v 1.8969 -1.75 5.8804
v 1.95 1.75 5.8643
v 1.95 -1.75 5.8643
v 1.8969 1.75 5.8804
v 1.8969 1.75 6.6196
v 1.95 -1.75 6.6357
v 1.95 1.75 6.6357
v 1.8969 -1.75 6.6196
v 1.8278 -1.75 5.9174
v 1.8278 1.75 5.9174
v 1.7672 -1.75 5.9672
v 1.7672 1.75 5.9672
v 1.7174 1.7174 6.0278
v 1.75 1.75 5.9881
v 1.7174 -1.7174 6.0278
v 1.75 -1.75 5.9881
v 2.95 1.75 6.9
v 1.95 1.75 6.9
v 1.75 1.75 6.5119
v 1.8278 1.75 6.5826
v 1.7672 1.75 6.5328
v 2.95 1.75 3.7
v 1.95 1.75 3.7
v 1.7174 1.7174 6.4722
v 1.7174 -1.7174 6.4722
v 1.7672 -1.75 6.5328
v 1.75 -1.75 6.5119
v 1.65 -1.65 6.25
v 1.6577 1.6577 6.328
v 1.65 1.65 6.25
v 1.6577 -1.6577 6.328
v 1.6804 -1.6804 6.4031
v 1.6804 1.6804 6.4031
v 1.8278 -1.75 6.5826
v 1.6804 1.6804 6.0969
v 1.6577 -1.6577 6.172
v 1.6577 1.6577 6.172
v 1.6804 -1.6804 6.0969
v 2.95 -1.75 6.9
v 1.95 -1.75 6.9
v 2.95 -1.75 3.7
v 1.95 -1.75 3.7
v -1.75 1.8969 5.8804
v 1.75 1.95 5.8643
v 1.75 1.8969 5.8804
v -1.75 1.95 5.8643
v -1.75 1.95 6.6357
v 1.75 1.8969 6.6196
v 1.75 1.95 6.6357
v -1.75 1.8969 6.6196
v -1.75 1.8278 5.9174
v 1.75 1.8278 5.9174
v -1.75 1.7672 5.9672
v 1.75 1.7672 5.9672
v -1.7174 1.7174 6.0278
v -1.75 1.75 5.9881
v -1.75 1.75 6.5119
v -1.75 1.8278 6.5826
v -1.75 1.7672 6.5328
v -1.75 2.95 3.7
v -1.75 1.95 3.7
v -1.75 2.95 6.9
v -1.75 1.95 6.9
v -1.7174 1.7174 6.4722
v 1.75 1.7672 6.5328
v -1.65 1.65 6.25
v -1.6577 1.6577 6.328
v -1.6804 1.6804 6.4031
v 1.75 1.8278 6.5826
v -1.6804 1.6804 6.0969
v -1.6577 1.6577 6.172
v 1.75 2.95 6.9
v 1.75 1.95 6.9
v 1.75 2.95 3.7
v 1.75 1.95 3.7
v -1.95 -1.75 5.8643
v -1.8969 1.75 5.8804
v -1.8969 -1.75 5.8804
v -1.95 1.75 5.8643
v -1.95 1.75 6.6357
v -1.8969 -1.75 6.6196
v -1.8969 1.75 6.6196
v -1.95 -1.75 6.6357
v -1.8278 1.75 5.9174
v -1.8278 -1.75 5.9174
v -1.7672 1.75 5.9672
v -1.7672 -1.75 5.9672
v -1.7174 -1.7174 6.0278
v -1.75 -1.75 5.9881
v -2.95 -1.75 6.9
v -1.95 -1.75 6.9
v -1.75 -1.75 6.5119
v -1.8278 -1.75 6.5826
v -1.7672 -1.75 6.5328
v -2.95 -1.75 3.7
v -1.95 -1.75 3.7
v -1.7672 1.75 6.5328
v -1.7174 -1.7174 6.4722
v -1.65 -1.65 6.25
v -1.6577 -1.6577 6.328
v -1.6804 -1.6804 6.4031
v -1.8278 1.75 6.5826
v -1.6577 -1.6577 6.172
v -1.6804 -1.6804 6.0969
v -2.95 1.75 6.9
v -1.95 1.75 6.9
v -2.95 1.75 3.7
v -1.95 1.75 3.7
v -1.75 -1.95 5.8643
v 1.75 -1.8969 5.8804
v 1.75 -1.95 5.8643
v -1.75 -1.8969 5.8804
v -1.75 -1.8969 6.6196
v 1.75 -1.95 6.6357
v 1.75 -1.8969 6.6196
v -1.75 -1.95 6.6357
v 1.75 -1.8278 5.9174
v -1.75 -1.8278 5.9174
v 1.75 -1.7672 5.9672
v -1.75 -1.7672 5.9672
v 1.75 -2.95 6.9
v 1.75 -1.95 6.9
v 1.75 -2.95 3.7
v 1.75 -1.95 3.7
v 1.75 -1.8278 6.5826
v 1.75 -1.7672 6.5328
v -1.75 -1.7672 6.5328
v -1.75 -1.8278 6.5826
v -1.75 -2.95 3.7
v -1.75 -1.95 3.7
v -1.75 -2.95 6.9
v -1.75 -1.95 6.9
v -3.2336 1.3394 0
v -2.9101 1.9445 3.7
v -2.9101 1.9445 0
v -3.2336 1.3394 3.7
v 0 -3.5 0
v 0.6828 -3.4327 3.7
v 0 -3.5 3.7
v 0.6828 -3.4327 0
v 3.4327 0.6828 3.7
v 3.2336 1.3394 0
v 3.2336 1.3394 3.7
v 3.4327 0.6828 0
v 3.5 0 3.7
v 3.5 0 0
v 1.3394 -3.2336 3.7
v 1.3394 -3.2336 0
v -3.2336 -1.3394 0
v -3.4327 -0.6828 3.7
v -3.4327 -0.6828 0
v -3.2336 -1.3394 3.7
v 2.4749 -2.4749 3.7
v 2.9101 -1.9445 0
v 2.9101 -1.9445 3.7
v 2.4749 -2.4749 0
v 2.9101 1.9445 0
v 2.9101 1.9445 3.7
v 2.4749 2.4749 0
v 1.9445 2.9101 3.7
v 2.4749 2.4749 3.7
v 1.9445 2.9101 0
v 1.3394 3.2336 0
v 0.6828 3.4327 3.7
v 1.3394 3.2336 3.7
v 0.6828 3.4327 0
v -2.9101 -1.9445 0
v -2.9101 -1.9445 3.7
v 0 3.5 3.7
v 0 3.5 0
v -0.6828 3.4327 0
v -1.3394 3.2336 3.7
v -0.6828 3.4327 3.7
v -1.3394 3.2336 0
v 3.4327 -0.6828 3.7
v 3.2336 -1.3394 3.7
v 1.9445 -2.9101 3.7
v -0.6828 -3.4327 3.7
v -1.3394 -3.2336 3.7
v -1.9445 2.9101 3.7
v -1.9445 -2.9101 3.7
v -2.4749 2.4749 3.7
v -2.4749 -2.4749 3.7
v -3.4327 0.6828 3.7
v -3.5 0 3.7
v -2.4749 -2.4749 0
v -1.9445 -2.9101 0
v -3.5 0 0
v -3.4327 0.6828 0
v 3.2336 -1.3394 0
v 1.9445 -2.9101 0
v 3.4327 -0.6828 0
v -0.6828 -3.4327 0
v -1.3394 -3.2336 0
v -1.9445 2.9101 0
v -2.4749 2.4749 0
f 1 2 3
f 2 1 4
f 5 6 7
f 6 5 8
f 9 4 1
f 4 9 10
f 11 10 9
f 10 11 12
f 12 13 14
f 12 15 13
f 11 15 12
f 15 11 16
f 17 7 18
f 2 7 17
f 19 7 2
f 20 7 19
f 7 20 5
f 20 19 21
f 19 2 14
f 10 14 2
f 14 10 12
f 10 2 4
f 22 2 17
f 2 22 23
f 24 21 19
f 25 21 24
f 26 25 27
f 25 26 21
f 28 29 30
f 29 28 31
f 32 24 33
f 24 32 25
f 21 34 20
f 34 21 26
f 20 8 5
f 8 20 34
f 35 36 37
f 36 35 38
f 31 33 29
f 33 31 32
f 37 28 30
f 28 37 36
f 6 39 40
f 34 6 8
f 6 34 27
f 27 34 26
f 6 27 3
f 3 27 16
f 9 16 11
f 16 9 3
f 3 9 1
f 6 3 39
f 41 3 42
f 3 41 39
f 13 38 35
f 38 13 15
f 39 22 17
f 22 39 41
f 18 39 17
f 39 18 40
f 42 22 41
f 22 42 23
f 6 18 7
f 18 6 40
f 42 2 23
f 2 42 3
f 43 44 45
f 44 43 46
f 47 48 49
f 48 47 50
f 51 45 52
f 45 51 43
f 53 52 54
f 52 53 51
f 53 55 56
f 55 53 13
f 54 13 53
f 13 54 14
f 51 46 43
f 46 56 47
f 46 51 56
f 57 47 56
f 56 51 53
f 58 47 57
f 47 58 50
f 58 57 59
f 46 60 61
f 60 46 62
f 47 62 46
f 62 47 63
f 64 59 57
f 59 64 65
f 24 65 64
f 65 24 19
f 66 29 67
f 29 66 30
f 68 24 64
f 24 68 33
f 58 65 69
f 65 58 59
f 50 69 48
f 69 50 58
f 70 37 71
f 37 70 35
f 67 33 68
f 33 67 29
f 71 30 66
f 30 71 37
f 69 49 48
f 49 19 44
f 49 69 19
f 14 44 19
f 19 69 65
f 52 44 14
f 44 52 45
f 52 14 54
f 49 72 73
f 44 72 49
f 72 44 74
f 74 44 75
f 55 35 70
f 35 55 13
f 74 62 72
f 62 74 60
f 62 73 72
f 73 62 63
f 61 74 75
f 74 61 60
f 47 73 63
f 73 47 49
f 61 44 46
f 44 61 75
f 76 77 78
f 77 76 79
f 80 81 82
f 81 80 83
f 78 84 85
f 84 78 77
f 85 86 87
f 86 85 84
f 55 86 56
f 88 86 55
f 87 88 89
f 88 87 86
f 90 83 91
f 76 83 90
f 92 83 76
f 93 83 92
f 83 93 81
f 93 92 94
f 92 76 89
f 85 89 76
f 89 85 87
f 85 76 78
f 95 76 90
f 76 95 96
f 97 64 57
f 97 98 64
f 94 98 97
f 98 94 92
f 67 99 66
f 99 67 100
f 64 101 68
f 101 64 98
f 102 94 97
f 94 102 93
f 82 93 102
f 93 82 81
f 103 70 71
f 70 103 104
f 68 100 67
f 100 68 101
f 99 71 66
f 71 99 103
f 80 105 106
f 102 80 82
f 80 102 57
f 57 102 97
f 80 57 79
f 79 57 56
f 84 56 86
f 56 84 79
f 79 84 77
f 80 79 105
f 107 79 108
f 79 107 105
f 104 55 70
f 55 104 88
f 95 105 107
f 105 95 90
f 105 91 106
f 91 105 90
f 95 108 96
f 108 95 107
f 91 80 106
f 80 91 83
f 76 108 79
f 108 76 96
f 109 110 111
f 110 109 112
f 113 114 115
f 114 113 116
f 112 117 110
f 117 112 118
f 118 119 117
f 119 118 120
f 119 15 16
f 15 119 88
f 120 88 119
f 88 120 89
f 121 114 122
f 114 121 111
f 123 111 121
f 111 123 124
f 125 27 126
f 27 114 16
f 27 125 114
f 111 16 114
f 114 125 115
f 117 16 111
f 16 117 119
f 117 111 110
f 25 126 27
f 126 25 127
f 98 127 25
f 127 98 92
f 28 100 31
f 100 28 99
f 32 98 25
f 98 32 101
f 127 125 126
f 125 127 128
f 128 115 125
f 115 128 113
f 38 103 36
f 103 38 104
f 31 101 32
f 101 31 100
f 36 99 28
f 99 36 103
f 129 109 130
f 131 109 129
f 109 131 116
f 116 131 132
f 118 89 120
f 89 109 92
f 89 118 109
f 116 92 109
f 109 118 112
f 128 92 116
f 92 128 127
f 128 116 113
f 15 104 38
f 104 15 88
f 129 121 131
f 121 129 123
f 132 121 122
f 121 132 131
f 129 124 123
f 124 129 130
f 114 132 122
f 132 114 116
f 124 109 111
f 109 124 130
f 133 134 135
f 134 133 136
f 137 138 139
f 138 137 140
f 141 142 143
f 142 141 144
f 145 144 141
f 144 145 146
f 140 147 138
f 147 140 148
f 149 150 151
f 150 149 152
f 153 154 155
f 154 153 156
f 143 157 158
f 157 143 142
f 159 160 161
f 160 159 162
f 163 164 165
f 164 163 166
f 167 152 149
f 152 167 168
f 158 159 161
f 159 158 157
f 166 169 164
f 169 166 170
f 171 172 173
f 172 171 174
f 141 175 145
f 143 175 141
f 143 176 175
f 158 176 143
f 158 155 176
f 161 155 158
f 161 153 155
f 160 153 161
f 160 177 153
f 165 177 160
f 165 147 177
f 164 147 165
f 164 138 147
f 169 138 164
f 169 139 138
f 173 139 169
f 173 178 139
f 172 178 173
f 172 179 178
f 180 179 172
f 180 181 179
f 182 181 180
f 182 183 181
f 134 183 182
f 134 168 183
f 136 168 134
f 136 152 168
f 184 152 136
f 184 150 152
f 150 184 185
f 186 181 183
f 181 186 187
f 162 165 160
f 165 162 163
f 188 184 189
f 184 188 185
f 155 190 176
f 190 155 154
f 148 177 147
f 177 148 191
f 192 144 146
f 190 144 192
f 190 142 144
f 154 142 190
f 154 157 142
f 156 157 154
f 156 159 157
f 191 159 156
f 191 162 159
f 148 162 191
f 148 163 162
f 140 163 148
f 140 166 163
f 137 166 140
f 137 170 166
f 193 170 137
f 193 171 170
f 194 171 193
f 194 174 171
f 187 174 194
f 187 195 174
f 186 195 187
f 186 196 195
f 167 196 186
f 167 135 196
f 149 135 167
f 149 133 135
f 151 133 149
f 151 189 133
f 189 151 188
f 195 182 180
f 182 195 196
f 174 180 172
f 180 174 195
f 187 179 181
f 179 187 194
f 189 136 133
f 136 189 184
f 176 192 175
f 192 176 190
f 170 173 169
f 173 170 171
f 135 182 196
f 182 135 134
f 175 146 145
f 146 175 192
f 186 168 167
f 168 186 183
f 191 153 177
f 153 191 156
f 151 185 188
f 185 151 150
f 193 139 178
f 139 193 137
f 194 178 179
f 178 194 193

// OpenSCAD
lw=0.4;
mt=lw*4;

//bracketTest();
//translate([10,-2,mt*2+6]) rotate([-90,0,0]) 
buttonCap();


module bracketTest() {
  difference() {
    cube([20,mt*2,18]);
    translate([10,-0.1,mt*2+6]) rotate([-90,0,0]) cylinder(r=3.75,h=5,$fn=32);
  }
  cube([20,18,mt*2]);
  translate([0,mt*2,mt*2]) buttonBracket();
}

module buttonBracket() {
  difference() {
    union() {
      translate([5,7,0]) cube([10,3,12]);
      translate([4,0,0]) cube([12,3,12]);
      translate([2,0,0]) cube([2,5,12]);
      translate([16,0,0]) cube([2,5,12]);

    }
    translate([10,-0.1,6]) rotate([-90,0,0]) union() {
      cylinder(r=3.75,h=5,$fn=32);
      translate([-3.75,-8,0]) cube([7.5,8,4]);
    }
  }
}

module buttonCap() {
  //translate([-6,-6,0]) cube([12,12,1.5]);
  cylinder(r=3.5,h=mt*2+0.5,$fn=32);
  translate([0,0,mt*2+0.5]) {
    flange();
    rotate([0,0,90]) flange();
    rotate([0,0,180]) flange();
    rotate([0,0,270]) flange();

  }
}

module flange() {
  fDist=3.9;
  translate([fDist/2,-3.5/2,0]) {
    translate([0.1,0,2.55]) rotate([-90,0,0]) cylinder(r=0.4,h=3.5,$fn=32);
    cube([1,3.5,3.2]);
  }
}
